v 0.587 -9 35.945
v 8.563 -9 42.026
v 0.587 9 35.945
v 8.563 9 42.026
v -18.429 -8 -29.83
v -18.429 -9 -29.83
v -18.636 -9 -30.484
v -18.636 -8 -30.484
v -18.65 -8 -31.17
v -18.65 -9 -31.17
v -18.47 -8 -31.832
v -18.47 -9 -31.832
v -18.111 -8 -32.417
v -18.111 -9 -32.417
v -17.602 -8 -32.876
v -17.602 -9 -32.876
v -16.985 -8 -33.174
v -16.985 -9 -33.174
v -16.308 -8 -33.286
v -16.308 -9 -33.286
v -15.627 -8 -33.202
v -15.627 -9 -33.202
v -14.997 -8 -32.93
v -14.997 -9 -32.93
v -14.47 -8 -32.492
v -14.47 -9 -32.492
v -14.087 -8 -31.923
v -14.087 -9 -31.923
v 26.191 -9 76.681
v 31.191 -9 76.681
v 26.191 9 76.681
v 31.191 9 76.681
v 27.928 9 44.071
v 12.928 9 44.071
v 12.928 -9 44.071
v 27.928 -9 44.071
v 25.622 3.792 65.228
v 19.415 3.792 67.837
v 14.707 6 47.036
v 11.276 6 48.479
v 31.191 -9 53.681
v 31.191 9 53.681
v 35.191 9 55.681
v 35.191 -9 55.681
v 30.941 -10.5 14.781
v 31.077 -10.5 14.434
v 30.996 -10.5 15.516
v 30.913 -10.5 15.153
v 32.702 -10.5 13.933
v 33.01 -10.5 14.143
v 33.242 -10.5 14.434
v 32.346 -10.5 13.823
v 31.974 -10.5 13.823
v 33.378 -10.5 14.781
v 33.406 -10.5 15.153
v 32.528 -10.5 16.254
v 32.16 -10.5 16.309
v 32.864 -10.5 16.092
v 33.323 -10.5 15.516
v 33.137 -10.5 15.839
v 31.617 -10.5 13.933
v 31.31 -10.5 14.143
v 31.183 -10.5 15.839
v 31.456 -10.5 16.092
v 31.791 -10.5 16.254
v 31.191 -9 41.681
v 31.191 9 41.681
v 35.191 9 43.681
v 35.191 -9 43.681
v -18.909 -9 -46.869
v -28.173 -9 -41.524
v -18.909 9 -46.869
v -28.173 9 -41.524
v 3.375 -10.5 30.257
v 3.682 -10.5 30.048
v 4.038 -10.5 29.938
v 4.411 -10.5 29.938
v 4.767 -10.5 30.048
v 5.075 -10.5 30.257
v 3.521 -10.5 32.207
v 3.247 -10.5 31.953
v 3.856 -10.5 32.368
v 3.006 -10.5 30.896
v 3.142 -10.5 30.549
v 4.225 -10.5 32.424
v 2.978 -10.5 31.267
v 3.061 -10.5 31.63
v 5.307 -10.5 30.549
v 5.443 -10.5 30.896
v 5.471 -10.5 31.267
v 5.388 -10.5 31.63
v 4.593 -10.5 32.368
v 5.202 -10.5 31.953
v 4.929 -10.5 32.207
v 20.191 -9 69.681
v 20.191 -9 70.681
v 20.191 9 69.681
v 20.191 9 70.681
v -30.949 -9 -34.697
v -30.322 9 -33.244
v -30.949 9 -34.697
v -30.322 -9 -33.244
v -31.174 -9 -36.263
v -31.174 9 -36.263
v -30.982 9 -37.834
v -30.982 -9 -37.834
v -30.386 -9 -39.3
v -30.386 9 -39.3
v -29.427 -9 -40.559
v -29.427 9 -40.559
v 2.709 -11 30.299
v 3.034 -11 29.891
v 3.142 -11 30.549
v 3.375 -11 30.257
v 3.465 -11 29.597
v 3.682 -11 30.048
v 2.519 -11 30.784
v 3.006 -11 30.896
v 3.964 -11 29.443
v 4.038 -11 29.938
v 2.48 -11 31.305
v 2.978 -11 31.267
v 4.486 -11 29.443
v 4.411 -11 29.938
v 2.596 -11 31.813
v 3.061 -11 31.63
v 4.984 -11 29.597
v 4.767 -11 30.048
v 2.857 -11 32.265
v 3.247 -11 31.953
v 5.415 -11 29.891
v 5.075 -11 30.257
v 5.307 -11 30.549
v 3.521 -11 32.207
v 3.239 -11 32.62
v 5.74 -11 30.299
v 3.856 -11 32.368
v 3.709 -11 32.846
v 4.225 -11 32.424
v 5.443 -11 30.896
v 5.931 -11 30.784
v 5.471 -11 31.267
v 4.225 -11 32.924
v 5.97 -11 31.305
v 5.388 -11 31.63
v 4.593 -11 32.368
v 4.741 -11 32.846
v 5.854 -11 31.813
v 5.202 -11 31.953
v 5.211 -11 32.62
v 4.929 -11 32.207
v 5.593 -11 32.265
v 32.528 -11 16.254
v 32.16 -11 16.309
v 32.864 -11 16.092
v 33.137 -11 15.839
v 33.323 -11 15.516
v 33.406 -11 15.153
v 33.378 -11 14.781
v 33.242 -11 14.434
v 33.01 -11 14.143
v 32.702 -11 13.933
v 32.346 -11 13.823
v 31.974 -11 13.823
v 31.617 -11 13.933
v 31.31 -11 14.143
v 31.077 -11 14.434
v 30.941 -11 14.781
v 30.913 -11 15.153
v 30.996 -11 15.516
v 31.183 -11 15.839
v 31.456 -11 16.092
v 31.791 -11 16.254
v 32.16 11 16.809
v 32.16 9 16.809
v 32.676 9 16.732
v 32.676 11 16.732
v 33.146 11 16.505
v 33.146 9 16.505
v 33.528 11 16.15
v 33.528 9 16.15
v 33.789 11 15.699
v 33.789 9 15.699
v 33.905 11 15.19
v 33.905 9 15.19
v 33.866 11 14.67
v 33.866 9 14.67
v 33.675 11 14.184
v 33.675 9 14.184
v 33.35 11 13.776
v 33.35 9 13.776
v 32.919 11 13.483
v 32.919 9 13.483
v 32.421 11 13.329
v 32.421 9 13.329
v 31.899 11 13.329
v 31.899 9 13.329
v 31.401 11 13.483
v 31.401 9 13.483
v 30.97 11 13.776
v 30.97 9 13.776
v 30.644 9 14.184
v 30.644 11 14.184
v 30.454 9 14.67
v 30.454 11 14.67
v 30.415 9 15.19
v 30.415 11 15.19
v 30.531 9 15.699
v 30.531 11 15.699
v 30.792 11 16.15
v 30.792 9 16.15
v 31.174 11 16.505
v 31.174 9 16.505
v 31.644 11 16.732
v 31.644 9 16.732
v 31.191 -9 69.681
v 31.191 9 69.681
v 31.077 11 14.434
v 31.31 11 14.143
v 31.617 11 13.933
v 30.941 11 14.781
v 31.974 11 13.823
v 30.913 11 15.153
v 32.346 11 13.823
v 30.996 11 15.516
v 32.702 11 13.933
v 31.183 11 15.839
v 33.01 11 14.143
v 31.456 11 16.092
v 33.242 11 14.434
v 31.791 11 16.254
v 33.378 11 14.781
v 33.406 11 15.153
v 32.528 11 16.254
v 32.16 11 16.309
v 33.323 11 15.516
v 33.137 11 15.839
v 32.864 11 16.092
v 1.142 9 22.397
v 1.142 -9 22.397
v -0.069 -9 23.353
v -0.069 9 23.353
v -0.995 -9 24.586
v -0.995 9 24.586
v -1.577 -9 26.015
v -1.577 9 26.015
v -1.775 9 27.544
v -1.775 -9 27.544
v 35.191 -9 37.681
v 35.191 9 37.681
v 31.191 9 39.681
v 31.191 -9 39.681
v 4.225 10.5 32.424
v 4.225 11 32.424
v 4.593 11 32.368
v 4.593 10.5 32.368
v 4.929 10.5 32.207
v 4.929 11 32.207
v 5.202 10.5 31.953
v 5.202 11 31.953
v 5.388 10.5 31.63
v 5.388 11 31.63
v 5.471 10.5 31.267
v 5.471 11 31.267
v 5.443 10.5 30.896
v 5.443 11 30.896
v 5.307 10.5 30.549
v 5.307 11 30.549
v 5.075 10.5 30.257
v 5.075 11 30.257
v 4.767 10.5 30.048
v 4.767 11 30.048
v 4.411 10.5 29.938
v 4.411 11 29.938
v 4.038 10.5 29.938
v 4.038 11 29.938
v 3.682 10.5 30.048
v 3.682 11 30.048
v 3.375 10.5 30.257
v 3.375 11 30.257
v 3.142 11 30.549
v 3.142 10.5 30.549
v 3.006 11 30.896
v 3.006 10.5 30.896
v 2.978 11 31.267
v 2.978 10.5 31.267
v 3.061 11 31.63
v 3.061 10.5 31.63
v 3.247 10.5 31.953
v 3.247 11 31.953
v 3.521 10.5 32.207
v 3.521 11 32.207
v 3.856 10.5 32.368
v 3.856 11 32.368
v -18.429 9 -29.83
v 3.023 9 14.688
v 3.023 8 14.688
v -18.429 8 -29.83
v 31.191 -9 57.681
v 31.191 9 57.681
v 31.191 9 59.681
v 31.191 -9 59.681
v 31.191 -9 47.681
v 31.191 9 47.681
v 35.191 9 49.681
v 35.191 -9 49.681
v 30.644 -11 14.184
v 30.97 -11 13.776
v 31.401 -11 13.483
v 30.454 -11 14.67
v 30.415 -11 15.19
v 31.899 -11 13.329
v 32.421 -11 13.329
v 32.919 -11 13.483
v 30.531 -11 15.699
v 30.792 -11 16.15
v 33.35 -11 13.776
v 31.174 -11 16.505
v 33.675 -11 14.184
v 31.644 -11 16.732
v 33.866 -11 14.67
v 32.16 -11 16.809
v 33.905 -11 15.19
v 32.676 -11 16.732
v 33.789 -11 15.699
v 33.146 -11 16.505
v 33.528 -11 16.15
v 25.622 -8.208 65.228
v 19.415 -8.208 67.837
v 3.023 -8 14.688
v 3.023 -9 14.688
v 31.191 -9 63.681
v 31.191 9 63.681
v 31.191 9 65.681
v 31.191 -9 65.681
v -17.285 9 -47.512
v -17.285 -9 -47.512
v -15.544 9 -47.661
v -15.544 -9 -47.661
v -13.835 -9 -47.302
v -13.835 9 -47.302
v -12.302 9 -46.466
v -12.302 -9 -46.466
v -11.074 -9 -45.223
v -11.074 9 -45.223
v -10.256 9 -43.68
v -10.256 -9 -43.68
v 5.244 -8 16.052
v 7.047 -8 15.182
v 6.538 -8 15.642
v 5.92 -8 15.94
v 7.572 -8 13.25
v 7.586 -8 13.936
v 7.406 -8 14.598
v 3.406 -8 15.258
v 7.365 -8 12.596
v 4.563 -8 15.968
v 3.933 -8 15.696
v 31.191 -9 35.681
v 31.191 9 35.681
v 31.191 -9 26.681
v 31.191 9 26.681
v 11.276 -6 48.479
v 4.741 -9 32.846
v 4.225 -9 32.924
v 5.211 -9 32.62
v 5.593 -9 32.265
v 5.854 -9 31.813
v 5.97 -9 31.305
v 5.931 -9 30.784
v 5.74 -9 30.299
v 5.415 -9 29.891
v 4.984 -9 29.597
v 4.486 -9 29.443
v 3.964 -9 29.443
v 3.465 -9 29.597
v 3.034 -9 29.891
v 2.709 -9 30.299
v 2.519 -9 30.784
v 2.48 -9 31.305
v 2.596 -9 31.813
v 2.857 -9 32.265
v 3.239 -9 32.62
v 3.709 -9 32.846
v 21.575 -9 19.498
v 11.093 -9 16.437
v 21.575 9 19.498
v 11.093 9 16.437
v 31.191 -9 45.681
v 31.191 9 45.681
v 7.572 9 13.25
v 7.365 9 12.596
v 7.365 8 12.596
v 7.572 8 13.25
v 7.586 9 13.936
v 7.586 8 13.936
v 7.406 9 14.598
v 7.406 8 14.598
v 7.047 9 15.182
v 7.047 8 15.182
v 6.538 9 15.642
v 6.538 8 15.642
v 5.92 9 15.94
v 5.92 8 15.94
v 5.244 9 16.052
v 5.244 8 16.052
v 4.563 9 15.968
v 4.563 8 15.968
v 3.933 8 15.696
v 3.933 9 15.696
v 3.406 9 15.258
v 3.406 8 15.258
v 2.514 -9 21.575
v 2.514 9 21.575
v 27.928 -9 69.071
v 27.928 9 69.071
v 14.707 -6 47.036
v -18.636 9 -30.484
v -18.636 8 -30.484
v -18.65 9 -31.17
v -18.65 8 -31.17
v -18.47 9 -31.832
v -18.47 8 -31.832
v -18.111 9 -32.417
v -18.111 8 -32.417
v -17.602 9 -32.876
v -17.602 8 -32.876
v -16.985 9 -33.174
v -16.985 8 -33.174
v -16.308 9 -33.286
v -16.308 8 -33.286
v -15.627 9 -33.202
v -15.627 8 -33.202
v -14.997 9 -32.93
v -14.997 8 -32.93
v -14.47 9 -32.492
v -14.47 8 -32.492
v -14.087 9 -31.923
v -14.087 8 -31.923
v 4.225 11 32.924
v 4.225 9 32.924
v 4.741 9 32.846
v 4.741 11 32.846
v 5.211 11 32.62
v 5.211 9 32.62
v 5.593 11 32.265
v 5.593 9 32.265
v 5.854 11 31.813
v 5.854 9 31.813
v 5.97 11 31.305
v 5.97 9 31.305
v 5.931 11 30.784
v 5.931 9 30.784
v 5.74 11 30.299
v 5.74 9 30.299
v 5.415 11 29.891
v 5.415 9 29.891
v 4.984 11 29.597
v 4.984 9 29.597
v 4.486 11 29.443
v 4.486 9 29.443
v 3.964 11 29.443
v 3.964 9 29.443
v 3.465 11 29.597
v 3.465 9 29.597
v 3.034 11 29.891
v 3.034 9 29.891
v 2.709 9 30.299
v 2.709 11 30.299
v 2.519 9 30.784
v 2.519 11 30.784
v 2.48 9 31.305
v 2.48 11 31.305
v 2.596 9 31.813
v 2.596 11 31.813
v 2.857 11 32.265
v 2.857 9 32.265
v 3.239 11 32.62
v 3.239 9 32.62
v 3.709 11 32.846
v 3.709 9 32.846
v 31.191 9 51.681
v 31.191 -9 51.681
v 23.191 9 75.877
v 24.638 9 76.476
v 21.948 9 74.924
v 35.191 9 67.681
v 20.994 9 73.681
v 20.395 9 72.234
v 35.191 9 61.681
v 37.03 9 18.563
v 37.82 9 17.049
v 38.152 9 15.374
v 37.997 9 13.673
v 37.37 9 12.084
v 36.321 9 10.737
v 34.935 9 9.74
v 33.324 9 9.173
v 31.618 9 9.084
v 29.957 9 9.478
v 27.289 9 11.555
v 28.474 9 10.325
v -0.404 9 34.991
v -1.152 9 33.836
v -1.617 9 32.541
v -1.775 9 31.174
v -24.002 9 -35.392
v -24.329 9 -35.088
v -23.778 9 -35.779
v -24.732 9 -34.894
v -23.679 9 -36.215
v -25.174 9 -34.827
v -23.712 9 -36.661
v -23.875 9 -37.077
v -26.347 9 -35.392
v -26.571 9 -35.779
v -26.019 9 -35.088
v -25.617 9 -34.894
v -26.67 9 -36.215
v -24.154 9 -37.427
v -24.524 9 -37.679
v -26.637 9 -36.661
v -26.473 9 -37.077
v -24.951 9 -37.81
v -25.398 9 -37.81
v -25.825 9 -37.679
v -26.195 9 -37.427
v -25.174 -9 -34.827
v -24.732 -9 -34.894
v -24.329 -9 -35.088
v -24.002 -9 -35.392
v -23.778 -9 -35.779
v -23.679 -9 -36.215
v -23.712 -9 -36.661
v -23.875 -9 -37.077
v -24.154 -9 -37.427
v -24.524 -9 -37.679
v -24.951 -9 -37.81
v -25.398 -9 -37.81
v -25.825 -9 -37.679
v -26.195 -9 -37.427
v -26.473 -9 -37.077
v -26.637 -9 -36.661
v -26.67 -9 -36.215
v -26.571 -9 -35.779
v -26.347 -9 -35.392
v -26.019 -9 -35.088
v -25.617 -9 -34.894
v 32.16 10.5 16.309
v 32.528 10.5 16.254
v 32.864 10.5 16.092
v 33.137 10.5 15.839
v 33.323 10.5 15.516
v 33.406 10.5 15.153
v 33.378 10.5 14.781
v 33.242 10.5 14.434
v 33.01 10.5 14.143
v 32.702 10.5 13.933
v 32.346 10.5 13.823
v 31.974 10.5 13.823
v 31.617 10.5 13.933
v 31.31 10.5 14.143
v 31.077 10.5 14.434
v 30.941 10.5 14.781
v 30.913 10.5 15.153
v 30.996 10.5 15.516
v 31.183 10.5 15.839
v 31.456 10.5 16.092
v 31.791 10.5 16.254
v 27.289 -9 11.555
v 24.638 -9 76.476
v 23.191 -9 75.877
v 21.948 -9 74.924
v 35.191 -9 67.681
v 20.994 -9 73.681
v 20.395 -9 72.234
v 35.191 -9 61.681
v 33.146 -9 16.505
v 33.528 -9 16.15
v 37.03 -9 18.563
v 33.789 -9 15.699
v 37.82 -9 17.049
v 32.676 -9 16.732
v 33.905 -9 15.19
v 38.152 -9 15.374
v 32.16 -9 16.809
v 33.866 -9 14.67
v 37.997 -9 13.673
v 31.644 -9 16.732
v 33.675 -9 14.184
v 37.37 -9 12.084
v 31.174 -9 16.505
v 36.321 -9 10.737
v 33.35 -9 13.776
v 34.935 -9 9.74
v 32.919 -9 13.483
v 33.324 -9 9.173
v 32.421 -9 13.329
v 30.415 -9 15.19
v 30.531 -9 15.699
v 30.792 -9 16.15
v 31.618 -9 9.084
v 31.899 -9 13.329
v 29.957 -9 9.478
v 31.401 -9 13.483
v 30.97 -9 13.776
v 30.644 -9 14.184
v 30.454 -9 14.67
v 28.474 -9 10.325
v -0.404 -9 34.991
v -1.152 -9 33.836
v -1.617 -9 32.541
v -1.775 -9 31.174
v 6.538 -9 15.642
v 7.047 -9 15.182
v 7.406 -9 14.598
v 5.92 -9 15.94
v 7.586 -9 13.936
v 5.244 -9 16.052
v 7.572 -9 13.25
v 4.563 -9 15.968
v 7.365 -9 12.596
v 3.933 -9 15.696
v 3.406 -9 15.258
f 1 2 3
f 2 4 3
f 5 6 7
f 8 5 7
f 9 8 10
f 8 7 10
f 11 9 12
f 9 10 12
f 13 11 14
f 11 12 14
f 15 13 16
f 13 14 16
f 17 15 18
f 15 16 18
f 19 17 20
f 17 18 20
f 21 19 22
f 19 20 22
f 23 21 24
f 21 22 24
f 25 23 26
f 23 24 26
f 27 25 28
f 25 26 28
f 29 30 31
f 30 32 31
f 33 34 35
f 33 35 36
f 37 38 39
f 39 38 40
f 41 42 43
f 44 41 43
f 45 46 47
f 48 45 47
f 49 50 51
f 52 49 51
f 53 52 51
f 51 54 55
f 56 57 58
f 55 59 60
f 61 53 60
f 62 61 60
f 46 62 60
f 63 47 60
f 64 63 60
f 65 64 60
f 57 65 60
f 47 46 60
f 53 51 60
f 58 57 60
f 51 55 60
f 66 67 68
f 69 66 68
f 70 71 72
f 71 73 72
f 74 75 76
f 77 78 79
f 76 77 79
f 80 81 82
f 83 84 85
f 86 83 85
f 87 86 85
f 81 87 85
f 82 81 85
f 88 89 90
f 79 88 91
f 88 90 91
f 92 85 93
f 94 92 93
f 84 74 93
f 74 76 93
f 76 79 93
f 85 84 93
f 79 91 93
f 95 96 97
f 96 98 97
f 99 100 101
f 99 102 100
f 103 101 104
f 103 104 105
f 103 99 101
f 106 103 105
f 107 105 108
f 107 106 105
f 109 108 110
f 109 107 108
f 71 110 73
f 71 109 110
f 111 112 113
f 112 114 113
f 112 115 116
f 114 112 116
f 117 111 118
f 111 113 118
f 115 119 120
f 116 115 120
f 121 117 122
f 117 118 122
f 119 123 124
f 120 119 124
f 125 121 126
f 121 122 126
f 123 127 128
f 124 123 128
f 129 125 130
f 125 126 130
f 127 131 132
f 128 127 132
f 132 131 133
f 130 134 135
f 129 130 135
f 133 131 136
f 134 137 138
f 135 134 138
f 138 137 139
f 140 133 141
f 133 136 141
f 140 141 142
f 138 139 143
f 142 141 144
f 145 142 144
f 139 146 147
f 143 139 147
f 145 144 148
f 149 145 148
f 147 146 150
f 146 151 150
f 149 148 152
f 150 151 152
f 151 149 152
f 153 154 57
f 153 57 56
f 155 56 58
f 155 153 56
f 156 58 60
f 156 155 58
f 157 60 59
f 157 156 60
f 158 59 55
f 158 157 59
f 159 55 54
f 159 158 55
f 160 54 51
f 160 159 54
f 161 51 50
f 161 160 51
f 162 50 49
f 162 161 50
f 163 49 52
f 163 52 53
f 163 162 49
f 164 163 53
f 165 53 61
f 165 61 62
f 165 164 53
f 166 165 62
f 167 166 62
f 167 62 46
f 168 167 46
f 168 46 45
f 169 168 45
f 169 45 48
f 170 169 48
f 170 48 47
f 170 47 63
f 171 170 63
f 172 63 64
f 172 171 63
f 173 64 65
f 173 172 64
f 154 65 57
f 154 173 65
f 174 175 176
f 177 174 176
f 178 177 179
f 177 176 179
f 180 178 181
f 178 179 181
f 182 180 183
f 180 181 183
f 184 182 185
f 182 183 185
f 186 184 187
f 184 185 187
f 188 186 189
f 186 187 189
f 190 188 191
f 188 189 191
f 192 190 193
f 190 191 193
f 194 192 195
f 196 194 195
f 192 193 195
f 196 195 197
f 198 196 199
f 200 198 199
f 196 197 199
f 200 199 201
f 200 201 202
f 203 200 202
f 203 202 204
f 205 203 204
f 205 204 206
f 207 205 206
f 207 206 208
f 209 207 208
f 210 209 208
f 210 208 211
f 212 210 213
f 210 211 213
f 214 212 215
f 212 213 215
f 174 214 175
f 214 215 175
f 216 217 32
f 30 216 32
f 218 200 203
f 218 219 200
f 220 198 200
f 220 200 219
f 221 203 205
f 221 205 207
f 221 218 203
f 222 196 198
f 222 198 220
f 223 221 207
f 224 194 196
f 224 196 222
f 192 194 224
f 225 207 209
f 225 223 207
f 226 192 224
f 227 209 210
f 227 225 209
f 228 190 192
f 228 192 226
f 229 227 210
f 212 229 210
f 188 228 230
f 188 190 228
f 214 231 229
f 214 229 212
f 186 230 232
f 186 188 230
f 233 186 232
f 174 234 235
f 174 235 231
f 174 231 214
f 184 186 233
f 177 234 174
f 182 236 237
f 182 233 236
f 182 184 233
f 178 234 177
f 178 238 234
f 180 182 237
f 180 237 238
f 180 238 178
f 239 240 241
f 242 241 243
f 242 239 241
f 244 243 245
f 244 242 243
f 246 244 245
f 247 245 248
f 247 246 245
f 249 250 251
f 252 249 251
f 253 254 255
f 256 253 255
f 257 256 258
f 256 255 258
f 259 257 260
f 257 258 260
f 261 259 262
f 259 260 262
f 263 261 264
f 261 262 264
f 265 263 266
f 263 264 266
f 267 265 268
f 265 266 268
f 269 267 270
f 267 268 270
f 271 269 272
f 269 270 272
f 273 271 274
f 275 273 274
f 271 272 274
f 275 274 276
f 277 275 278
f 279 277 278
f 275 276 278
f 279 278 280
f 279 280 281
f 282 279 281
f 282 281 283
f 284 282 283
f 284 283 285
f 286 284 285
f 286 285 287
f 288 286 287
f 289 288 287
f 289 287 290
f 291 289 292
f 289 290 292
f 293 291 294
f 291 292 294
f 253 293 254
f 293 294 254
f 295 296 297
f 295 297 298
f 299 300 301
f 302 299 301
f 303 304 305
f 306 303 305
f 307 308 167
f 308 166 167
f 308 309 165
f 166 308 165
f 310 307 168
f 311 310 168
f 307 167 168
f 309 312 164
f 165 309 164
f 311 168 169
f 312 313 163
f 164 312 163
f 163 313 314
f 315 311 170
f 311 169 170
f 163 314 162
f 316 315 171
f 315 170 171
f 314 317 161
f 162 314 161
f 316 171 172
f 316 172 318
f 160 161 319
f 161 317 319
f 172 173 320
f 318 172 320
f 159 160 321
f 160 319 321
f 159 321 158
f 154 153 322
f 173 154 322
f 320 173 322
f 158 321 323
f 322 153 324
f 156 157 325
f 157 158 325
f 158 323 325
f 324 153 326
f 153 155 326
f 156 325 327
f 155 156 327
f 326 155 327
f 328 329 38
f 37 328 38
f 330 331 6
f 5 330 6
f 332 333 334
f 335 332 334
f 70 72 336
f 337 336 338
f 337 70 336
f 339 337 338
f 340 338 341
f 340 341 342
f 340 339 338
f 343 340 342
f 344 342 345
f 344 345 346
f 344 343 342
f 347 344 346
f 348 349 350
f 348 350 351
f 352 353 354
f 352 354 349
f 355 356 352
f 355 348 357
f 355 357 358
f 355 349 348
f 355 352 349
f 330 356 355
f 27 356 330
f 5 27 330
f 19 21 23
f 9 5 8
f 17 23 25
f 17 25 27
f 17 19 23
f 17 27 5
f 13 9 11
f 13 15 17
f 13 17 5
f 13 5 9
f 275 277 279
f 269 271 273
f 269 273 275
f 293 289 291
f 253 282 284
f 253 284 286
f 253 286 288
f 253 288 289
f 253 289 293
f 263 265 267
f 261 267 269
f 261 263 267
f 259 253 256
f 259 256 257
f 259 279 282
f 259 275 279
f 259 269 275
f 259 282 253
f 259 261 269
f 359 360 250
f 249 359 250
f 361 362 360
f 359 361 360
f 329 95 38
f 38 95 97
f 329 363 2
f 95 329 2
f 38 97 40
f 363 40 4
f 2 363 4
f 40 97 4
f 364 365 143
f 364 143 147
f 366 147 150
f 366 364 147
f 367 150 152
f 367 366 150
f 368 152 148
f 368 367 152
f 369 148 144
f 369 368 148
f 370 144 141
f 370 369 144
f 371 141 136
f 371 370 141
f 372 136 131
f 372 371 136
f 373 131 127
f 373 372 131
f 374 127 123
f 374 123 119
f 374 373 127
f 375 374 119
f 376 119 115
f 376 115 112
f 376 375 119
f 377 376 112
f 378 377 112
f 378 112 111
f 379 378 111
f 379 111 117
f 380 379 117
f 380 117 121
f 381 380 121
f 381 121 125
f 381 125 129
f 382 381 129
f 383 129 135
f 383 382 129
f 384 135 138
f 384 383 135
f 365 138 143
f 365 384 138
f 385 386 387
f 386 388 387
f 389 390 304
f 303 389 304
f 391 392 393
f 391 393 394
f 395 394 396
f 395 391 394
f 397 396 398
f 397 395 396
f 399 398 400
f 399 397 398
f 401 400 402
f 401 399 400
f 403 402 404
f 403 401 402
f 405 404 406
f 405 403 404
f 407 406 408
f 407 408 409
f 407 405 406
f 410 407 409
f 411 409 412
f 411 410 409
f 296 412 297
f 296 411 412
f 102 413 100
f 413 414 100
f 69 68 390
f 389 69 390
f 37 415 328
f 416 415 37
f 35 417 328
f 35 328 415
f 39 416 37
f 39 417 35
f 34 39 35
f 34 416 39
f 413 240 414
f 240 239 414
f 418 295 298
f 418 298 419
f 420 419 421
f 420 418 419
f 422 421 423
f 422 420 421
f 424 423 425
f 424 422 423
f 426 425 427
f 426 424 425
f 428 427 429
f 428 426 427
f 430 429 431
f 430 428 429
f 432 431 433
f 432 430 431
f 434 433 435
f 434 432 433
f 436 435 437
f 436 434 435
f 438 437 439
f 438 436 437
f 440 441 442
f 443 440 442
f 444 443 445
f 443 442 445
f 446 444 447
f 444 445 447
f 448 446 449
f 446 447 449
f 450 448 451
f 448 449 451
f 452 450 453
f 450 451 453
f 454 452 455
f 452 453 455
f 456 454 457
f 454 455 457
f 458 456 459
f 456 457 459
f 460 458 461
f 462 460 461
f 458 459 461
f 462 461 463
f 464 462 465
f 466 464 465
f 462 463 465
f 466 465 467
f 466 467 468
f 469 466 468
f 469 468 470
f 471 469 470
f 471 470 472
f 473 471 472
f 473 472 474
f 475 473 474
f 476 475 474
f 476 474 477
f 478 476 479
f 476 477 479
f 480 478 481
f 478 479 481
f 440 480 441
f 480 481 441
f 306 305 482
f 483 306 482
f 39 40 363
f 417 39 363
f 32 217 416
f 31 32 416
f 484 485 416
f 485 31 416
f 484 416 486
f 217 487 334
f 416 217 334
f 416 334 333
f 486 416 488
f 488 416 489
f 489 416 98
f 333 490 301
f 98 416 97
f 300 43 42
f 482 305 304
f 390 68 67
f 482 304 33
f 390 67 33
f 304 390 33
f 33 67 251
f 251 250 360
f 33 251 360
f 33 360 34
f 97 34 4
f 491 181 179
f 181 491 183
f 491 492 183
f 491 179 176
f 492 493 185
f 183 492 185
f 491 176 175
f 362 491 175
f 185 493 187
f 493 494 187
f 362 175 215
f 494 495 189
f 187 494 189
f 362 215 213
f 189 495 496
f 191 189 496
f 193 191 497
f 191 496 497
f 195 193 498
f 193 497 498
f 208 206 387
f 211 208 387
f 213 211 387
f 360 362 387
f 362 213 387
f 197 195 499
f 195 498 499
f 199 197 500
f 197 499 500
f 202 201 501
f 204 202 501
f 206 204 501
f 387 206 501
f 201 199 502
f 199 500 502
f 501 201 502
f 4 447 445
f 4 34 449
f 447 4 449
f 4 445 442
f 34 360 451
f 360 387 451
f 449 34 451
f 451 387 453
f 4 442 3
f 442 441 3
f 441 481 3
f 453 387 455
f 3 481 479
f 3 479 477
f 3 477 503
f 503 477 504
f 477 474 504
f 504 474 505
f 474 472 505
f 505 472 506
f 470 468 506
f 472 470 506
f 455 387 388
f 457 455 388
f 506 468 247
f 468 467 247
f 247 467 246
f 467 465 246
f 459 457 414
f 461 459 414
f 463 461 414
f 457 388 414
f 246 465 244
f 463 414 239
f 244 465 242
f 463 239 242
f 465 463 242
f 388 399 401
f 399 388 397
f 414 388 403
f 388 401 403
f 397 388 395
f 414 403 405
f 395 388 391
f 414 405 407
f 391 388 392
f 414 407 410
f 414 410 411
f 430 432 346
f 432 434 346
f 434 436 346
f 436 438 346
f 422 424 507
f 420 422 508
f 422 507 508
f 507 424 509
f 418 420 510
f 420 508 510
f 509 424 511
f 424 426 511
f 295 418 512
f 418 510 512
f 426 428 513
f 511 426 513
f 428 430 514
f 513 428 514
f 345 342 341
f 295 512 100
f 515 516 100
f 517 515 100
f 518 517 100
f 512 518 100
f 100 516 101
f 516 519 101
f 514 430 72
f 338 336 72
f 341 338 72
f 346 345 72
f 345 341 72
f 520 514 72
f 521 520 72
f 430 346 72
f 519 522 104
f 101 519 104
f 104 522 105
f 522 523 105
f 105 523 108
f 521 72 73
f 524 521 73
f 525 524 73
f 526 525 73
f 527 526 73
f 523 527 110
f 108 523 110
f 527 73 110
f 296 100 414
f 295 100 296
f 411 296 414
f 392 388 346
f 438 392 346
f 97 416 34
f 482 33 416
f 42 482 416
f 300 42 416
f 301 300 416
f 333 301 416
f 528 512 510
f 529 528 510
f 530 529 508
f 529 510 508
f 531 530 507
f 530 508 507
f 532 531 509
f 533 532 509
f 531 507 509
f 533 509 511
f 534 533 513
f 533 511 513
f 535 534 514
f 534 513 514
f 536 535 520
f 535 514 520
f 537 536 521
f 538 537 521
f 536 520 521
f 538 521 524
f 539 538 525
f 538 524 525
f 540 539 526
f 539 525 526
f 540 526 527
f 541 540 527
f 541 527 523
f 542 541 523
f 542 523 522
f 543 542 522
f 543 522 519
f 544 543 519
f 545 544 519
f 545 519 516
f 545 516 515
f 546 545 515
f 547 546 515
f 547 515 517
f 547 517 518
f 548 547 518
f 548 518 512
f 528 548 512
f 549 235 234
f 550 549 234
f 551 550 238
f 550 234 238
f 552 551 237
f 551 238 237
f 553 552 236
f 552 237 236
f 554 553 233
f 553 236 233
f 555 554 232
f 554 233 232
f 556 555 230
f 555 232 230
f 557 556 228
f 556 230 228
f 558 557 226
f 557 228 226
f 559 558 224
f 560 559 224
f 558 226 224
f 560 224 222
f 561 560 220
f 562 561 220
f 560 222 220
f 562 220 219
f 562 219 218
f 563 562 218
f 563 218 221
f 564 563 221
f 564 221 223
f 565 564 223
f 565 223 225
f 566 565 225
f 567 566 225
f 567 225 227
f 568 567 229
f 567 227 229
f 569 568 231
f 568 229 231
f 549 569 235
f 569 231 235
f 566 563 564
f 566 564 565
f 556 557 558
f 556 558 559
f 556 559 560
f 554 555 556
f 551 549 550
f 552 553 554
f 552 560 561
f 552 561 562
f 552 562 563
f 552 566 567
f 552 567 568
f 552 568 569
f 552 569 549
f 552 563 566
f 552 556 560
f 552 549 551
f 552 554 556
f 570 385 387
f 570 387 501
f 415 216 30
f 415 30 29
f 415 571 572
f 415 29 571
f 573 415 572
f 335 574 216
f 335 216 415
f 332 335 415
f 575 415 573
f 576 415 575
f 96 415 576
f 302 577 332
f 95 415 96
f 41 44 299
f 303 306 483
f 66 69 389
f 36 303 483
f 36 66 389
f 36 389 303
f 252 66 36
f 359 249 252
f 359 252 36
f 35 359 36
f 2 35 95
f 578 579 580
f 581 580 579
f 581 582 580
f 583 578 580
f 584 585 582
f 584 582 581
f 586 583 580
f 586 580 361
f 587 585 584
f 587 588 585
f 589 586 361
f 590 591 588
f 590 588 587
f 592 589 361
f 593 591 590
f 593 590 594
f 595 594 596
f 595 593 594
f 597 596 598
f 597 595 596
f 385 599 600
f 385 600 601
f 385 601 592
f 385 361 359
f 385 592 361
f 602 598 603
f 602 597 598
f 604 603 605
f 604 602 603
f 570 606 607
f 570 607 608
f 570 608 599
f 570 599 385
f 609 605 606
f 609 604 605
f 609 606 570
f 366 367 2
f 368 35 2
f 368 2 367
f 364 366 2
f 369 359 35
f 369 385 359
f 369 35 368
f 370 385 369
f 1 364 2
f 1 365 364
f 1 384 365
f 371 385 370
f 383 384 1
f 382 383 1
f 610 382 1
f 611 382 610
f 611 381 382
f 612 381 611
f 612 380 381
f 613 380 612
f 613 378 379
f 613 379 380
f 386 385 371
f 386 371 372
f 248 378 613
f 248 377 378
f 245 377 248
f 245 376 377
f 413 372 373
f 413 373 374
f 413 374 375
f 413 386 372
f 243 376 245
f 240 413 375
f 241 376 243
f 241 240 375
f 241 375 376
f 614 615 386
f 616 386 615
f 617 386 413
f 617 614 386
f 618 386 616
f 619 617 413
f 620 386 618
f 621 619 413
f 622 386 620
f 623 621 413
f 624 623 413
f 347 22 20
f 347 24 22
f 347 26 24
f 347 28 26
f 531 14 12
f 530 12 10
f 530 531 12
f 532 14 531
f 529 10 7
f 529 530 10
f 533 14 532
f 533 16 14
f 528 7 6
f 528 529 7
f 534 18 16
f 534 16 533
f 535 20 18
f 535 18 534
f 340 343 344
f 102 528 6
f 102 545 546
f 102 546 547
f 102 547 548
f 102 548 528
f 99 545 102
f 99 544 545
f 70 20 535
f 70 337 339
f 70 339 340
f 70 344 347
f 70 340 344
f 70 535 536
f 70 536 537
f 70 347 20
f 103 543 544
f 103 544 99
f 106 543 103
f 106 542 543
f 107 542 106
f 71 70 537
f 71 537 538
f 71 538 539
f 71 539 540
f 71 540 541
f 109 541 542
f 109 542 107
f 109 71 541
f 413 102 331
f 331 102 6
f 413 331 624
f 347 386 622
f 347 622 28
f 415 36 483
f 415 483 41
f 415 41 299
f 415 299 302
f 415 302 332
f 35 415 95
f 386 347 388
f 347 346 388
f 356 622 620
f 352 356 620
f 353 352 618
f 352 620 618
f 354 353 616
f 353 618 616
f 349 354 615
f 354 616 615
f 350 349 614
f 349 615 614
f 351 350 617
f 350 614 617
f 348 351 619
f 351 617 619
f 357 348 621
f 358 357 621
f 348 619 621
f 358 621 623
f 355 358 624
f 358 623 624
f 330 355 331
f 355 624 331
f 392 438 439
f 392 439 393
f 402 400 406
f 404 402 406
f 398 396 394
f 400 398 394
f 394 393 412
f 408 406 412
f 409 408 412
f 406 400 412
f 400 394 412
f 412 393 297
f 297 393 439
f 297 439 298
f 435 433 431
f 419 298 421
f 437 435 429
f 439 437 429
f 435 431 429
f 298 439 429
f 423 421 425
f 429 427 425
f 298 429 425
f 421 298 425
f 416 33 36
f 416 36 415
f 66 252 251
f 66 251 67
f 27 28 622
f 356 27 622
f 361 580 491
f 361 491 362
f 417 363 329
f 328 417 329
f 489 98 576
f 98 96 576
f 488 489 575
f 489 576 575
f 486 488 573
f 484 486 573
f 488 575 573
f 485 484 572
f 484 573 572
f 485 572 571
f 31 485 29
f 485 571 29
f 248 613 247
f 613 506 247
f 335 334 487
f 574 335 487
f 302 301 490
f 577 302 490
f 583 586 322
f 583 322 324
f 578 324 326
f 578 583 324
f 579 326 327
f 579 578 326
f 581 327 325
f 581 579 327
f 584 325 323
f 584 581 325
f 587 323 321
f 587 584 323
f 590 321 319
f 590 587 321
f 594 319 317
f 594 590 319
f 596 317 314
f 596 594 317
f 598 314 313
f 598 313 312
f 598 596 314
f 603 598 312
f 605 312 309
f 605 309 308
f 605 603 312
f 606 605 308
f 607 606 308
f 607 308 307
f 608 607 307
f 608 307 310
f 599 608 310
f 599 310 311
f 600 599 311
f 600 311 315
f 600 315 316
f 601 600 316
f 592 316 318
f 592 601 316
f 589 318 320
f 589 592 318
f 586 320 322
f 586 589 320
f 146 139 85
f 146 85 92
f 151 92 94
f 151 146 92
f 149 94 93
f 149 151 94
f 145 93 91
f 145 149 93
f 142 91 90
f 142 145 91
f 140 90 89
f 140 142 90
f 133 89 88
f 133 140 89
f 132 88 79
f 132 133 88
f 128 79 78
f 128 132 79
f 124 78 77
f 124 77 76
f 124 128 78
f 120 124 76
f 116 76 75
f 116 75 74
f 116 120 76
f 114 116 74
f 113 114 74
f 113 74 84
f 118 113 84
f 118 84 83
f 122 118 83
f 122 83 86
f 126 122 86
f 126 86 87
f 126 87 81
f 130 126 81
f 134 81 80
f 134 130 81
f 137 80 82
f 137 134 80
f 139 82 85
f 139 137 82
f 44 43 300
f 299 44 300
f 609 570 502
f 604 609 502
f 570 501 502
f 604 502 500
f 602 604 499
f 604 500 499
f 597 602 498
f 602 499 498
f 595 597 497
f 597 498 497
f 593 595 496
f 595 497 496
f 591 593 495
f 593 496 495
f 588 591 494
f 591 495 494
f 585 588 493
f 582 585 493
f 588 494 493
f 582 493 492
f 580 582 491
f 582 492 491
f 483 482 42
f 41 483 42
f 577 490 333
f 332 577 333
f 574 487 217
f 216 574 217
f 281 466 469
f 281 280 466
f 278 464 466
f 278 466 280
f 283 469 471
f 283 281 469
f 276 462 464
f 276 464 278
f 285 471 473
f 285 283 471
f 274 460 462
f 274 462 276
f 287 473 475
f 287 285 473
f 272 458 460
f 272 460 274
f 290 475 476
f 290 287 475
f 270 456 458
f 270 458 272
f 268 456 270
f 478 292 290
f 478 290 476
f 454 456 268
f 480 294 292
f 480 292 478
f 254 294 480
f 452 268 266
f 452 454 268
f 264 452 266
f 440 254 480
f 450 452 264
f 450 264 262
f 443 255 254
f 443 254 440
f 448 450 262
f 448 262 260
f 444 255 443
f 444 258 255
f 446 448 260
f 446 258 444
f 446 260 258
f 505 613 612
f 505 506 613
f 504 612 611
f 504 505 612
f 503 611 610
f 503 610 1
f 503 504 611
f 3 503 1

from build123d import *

# Parameters (mm, degrees)
BOSS_EXTRUDE1_DEPTH = 9
CUT_EXTRUDE1_DEPTH  = 26
BOSS_EXTRUDE2_DEPTH = 18
LPATTERN1_COUNT     = 6
LPATTERN1_PITCH     = 6
FILLET1_R           = 6
FILLET2_R           = 6
FILLET3_R           = 6
SKETCH4_R           = 1.5
CUT_EXTRUDE2_DEPTH  = 88.522155905
CUT_EXTRUDE3_DEPTH  = 9
SKETCH6_R           = 1.75
BOSS_EXTRUDE3_DEPTH = 2
SKETCH7_R           = 1.25
CUT_EXTRUDE4_DEPTH  = 0.5
CUT_EXTRUDE5_DEPTH  = 1


with BuildPart() as part:
    # Sketch1 → Boss-Extrude1 (new, symmetric)
    with BuildSketch(Plane(origin=(0, 0, 0), x_dir=(1, 0, 0), z_dir=(0, 1, 0))):
        with BuildLine():
            Line((2.514105873, -21.575108952), (-33.455759115, 38.476275817))
            Line((-33.455759115, 38.476275817), (-12.667369645, 50.469726664))
            Line((-12.667369645, 50.469726664), (11.092875126, -16.436556811))
            Line((11.092875126, -16.436556811), (21.575489497, -19.497759324))
            Line((21.575489497, -19.497759324), (27.289214074, -11.555417826))
            ThreePointArc((27.289214074, -11.555417826), (35.663709394, -10.188732731), (37.030394489, -18.56322805))
            Line((37.030394489, -18.56322805), (31.190552636, -26.680878395))
            Line((31.190552636, -26.680878395), (31.190552636, -76.680878395))
            Line((31.190552636, -76.680878395), (20.190552636, -76.680878395))
            Line((20.190552636, -76.680878395), (20.190552636, -69.680878395))
            Line((20.190552636, -69.680878395), (8.563166422, -42.02579044))
            Line((8.563166422, -42.02579044), (-1.775278753, -34.144385023))
            Line((-1.775278753, -34.144385023), (-1.775278753, -24.144385023))
            Line((-1.775278753, -24.144385023), (2.514105873, -21.575108952))
        make_face()
    extrude(amount=BOSS_EXTRUDE1_DEPTH, both=True)

    # Sketch2 → Cut-Extrude1 (cut)
    with BuildSketch(Plane(origin=(0, 9, 0), x_dir=(1, 0, 0), z_dir=(0, 1, 0))):
        Polygon((12.928109305, -44.071308637), (27.928109305, -44.071308637), (27.928109305, -69.071308637), align=None)
    extrude(amount=-CUT_EXTRUDE1_DEPTH, mode=Mode.SUBTRACT)

    # Sketch3 → Boss-Extrude2 (add)
    with BuildSketch(Plane(origin=(0, 9, 0), x_dir=(1, 0, 0), z_dir=(0, 1, 0))):
        Polygon((31.190552636, -69.680878395), (31.190552636, -65.680878395), (35.190552636, -67.680878395), align=None)
    boss_extrude2 = extrude(amount=-BOSS_EXTRUDE2_DEPTH)

    # LPattern1: Boss-Extrude2 ×6
    with Locations(*[(0, 0, -i * LPATTERN1_PITCH) for i in range(1, LPATTERN1_COUNT)]):
        add(boss_extrude2)

    # Fillet1
    fillet1_edges = [part.edges().sort_by_distance(p)[0] for p in [
        (-33.455759115, 0, -38.476275817),
        (-12.667369645, 0, -50.469726664),
    ]]
    fillet(fillet1_edges, radius=FILLET1_R)

    # Fillet2
    fillet2_edges = [part.edges().sort_by_distance(p)[0] for p in [
        (-1.775278753, 0, 34.144385023),
        (-1.775278753, 0, 24.144385023),
    ]]
    fillet(fillet2_edges, radius=FILLET2_R)

    # Fillet3
    fillet3_edges = [part.edges().sort_by_distance(p)[0] for p in [
        (20.190552636, 0, 76.680878395),
    ]]
    fillet(fillet3_edges, radius=FILLET3_R)

    # Sketch4 → Cut-Extrude2 (cut, through all)
    with BuildSketch(Plane(origin=(0, 9, 0), x_dir=(1, 0, 0), z_dir=(0, 1, 0))):
        with Locations(Location((-25.174418311, 36.32708835, 0), (0, 0, 270))):
            Circle(SKETCH4_R)
    extrude(amount=-CUT_EXTRUDE2_DEPTH, mode=Mode.SUBTRACT)

    # Sketch5 → Cut-Extrude3 (cut)
    with BuildSketch(Plane(origin=(-7.738353784, 0, 3.25353614), x_dir=(0.38757954045785686, 0, 0.9218362651894731), z_dir=(-0.921836265189473, 0, 0.3875795404578568))):
        Polygon((49.059805807, 6), (49.059805807, -6), (70.059805807, -8.207927909), (70.059805807, 3.792072091), align=None)
    extrude(amount=-CUT_EXTRUDE3_DEPTH, mode=Mode.SUBTRACT)

    # Sketch6 → Boss-Extrude3 (add)
    with BuildSketch(Plane(origin=(0, 9, 0), x_dir=(1, 0, 0), z_dir=(0, 1, 0))):
        with Locations(Location((32.159804282, -15.059322938, 0), (0, 0, 270))):
            Circle(SKETCH6_R)
        with Locations(Location((4.224721247, -31.173767393, 0), (0, 0, 270))):
            Circle(SKETCH6_R)
    boss_extrude3 = extrude(amount=BOSS_EXTRUDE3_DEPTH)

    # Sketch7 → Cut-Extrude4 (cut)
    with BuildSketch(Plane(origin=(0, 11, 0), x_dir=(1, 0, 0), z_dir=(0, 1, 0))):
        with Locations(Location((4.224721247, -31.173767393, 0), (0, 0, 270))):
            Circle(SKETCH7_R)
        with Locations(Location((32.159804282, -15.059322938, 0), (0, 0, 270))):
            Circle(SKETCH7_R)
    cut_extrude4 = extrude(amount=-CUT_EXTRUDE4_DEPTH, mode=Mode.SUBTRACT)

    # Sketch8 → Cut-Extrude5 (cut)
    with BuildSketch(Plane(origin=(0, 9, 0), x_dir=(1, 0, 0), z_dir=(0, 1, 0))):
        with BuildLine():
            Line((-14.087027859, 31.922607918), (7.364953265, -12.596019576))
            ThreePointArc((7.364953265, -12.596019576), (6.240093161, -15.813119473), (3.022993263, -14.688259369))
            Line((3.022993263, -14.688259369), (-18.428987861, 29.830368124))
            ThreePointArc((-18.428987861, 29.830368124), (-17.304127757, 33.047468022), (-14.087027859, 31.922607918))
        make_face()
    cut_extrude5 = extrude(amount=-CUT_EXTRUDE5_DEPTH, mode=Mode.SUBTRACT)

    # Mirror1: Boss-Extrude3, Cut-Extrude4, Cut-Extrude5 across plane
    add(boss_extrude3.mirror(Plane.ZX))
    add(cut_extrude4.mirror(Plane.ZX), mode=Mode.SUBTRACT)
    add(cut_extrude5.mirror(Plane.ZX), mode=Mode.SUBTRACT)


solid = part.part
